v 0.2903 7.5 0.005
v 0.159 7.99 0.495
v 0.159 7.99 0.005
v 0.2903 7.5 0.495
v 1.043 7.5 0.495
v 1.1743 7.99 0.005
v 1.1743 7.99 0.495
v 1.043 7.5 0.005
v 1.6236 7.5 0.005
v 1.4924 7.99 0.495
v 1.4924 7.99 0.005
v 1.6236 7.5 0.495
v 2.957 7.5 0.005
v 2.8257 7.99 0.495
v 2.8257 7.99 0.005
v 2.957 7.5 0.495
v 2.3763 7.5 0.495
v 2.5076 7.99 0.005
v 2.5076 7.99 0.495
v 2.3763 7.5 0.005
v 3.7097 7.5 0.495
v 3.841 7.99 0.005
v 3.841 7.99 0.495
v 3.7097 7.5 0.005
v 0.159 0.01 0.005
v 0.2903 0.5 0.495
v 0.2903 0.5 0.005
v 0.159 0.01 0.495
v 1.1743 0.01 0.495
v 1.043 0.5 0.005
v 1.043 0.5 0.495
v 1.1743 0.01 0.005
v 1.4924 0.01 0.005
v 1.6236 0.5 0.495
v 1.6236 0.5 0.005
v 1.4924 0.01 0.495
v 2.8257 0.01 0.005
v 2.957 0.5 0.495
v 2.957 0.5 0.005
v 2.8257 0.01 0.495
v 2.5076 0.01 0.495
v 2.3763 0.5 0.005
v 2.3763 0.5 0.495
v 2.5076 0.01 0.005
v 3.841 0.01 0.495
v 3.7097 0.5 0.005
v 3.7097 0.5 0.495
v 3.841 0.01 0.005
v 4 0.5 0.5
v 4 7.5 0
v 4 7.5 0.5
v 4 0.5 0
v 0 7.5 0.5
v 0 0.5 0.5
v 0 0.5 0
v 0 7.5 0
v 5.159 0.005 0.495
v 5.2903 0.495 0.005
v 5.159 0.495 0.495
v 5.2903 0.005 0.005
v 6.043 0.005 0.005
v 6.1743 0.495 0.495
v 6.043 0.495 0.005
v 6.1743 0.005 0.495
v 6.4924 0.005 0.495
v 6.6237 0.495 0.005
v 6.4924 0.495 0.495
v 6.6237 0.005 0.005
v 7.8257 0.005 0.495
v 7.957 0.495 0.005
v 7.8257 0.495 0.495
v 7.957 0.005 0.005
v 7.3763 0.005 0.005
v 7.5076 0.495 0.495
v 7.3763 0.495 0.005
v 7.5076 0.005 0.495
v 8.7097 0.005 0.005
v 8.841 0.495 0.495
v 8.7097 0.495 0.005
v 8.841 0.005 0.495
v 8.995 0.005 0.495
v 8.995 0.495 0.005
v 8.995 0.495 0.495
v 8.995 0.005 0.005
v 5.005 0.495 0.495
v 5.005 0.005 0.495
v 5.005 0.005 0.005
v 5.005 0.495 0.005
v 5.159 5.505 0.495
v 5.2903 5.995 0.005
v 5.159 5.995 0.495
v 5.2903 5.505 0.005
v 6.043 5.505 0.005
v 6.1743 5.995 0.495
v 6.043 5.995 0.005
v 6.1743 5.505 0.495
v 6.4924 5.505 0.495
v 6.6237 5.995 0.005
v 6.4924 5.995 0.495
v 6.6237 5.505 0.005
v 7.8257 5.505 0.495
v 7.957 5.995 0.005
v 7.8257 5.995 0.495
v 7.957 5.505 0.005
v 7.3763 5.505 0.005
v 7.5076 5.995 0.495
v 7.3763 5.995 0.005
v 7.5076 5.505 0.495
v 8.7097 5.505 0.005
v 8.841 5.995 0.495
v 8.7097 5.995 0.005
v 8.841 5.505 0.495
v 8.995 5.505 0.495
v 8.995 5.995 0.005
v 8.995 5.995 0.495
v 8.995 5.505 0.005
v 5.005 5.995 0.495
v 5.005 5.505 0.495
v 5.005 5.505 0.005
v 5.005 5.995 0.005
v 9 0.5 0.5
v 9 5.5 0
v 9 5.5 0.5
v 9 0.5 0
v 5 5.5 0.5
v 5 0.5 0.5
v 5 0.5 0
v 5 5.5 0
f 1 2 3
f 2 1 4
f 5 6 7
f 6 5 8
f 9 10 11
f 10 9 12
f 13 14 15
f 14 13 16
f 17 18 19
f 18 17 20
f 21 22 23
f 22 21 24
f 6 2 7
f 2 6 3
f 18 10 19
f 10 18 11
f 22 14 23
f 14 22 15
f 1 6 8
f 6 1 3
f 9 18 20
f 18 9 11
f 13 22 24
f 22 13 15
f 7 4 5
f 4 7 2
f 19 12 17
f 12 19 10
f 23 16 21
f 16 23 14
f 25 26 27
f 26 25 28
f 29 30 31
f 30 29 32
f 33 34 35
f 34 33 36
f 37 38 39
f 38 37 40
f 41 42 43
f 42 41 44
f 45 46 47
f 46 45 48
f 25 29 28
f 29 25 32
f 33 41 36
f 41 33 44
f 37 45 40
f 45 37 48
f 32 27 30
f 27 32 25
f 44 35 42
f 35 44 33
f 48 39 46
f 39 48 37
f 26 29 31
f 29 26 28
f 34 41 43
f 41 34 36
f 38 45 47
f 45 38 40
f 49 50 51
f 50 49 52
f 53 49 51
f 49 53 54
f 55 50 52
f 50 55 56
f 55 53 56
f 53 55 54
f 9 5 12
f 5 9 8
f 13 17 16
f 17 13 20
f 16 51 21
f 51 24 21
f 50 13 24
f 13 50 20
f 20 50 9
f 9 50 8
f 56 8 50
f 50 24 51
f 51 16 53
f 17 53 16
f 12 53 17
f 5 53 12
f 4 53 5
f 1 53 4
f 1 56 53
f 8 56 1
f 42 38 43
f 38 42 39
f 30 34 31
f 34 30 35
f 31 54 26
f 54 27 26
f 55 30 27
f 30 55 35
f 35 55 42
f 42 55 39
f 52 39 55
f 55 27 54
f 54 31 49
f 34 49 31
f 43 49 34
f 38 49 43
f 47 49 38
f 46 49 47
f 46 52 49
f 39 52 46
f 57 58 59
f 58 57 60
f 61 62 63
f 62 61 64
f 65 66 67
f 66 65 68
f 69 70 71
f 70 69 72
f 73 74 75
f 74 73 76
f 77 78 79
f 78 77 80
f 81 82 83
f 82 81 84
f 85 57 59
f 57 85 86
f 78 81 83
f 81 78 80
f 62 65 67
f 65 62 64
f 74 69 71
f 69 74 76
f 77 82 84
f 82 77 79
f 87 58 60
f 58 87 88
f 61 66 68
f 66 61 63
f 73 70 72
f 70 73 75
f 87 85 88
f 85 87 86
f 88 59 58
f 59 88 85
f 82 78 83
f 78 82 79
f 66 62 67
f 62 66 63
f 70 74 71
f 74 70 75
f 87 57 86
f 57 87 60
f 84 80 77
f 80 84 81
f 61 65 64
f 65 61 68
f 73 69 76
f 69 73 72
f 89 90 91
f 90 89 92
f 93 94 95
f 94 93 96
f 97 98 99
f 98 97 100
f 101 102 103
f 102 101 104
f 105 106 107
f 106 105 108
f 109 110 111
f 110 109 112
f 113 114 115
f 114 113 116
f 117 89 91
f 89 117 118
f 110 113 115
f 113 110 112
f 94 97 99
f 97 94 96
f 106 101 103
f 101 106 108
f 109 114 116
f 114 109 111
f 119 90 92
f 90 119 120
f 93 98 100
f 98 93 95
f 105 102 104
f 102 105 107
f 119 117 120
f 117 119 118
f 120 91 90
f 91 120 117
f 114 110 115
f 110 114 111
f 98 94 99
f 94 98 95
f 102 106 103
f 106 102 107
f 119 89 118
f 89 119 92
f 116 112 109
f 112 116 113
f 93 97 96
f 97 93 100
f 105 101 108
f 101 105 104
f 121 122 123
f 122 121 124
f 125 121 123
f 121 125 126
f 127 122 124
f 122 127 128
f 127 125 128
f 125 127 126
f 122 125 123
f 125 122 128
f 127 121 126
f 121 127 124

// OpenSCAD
/**
 * pin_length is measured along the same axis as the length of the board.
 * pin_width is the width of the bottom of the pins, where they're widest.
 * pin_thickness is measured along the same axis as the board thickness.
 * tail_width is the width of the tails where they meet the bottom of the pins, where they're narrowest.
 */
module dovetail_pins(pin_length=.75, pin_width=1, pin_thickness=.75, pin_count=4, angle=15, tail_width=1, flat_pins=0) {
    intersection() {
        translate([0.005, 0.005, 0.005]) cube([(pin_count-1)*(pin_width+tail_width)-0.01, pin_length-0.01, pin_thickness-0.01]);
        if (flat_pins == 1) {
            rotate([90, 0, 0]) translate([0, 0, -pin_thickness]) dovetail_pins_idealized(
                pin_length=pin_length,
                pin_width=pin_width,
                pin_thickness=pin_thickness,
                pin_count=pin_count,
                angle=angle,
                tail_width=tail_width
            );
        } else {
            dovetail_pins_idealized(
                pin_length=pin_length,
                pin_width=pin_width,
                pin_thickness=pin_thickness,
                pin_count=pin_count,
                angle=angle,
                tail_width=tail_width
            );
        }
    }
}

/**
 * tail_length is measured along the same axis as the length of the board.
 * tail_width is the width of the tails where they meet the board, where they're narrowest.
 * tail_thickness is measured along the same axis as the board thickness.
 * pin_width is the width of the bottom of the pins, where they're widest.
 */
module dovetail_tails(tail_length=.75, tail_width=1, tail_thickness=.75, tail_count=3, angle=15, pin_width=1) {
    pin_count = tail_count + 1;
    pin_thickness = tail_length;
    pin_length = tail_thickness;
    
    translate([0, 0, tail_thickness]) {
        rotate([-90, 0, 0]) {
            translate([0, 0, -0.005]) {
                difference() {
                    translate([0.005, 0.005, 0.005]) {
                        cube([(pin_count-1)*(pin_width+tail_width)-0.01, tail_thickness-0.01, tail_length-0.01]);
                    }

                    dovetail_pins_idealized(
                        pin_length=pin_length,
                        pin_width=pin_width,
                        pin_thickness=pin_thickness,
                        pin_count=pin_count,
                        angle=angle,
                        tail_width=tail_width
                    );
                }
            }
        }
    }
}

/**
 * Used for generating both pins and tails. Don't call this directly.
 */
module dovetail_pins_idealized(
    pin_length=.75,
    pin_width=1,
    pin_thickness=.75,
    pin_count=4,
    angle=15,
    tail_width=1) {
        
    pin_width_top = pin_width - ( 2 * tan(angle) * pin_thickness );
    
    translate([0, pin_length, 0]) {
        rotate([90, 0, 0]) {
            intersection() {
                cube([(pin_count-1)*(pin_width+tail_width), pin_thickness, pin_length]);
                
                for (pin = [0:pin_count-1]) {
                    translate([pin * (pin_width + tail_width), 0]) {
                        linear_extrude(pin_length) {
                            polygon([
                                [-pin_width/2, 0], 
                                [-pin_width_top/2, pin_thickness],
                                [pin_width_top/2, pin_thickness],
                                [pin_width/2, 0]
                            ]);
                        }
                    }
                }
            }
        }
    }
}

/**
 * Determine the width the pins need to be once the tail widths are chosen.
 */
function pin_width (tail_width, tail_count, board_width) = ( board_width - (tail_width * tail_count) ) / (tail_count);

/**
 * Construct a board with tails cut into it. board_length includes the length of the tails.
 */
module board_with_dovetail_tails(board_length, board_width, board_thickness, tail_length, tail_width, pin_width, tail_count, angle) {
    
    tail_thickness = board_thickness;
    
    pin_width = pin_width(tail_width = tail_width, tail_count=tail_count, board_width=board_width);
    translate([0, board_length - ( 2 * tail_length) + tail_length, 0]) {
        dovetail_tails(tail_length=tail_length, tail_width=tail_width, tail_thickness=tail_thickness, tail_count=tail_count, angle=angle, pin_width=pin_width);
    }
    translate([0, tail_length, 0]) cube([board_width, board_length - ( 2 * tail_length), board_thickness]);
    translate([0, tail_length, 0]) mirror([0,1,0]) dovetail_tails(tail_length=tail_length, tail_width=tail_width, tail_thickness=tail_thickness, tail_count=tail_count, angle=angle, pin_width=pin_width);
}

/**
 * Construct a board with pins cut into it. board_length includes the length of the pins.
 */
module board_with_dovetail_pins(board_length, board_width, board_thickness, pin_length, tail_width, pin_width, pin_count, angle, flat_pins=0) {
    translate([0, board_length - ( 2 * pin_length) + pin_length, 0]) {
        dovetail_pins(pin_length=pin_length, pin_width=pin_width, pin_thickness=board_thickness, pin_count=pin_count, angle=angle, tail_width=tail_width, flat_pins=flat_pins);
    }
    translate([0, pin_length, 0]) cube([board_width, board_length - ( 2 * pin_length), board_thickness]);
    if (flat_pins == 1) {
        rotate([180,0,0]) translate([0,-board_thickness,-board_thickness]) dovetail_pins(pin_length=pin_length, pin_width=pin_width, pin_thickness=board_thickness, pin_count=pin_count, angle=angle, tail_width=tail_width, flat_pins=flat_pins);
    } else {
        dovetail_pins(pin_length=pin_length, pin_width=pin_width, pin_thickness=board_thickness, pin_count=pin_count, angle=angle, tail_width=tail_width, flat_pins=flat_pins);
    }
}

// An example set of boards.
tail_width = .75;
tail_count = 3;
board_width = 4;
angle = 15;
board_thickness = 0.5;
pin_width = pin_width(tail_width = tail_width, tail_count=tail_count, board_width=board_width);

board_with_dovetail_tails(
    board_length=8,
    board_width=board_width,
    board_thickness=board_thickness,
    tail_length=.5,
    tail_width=tail_width,
    pin_width=pin_width,
    tail_count=tail_count,
    angle=angle
);

translate([board_width + 1, 0, 0]) board_with_dovetail_pins(
    board_length=6,
    board_width=board_width,
    board_thickness=board_thickness,
    pin_length=.5,
    tail_width=tail_width,
    pin_width=pin_width,
    pin_count = tail_count + 1,
    angle=angle
);
